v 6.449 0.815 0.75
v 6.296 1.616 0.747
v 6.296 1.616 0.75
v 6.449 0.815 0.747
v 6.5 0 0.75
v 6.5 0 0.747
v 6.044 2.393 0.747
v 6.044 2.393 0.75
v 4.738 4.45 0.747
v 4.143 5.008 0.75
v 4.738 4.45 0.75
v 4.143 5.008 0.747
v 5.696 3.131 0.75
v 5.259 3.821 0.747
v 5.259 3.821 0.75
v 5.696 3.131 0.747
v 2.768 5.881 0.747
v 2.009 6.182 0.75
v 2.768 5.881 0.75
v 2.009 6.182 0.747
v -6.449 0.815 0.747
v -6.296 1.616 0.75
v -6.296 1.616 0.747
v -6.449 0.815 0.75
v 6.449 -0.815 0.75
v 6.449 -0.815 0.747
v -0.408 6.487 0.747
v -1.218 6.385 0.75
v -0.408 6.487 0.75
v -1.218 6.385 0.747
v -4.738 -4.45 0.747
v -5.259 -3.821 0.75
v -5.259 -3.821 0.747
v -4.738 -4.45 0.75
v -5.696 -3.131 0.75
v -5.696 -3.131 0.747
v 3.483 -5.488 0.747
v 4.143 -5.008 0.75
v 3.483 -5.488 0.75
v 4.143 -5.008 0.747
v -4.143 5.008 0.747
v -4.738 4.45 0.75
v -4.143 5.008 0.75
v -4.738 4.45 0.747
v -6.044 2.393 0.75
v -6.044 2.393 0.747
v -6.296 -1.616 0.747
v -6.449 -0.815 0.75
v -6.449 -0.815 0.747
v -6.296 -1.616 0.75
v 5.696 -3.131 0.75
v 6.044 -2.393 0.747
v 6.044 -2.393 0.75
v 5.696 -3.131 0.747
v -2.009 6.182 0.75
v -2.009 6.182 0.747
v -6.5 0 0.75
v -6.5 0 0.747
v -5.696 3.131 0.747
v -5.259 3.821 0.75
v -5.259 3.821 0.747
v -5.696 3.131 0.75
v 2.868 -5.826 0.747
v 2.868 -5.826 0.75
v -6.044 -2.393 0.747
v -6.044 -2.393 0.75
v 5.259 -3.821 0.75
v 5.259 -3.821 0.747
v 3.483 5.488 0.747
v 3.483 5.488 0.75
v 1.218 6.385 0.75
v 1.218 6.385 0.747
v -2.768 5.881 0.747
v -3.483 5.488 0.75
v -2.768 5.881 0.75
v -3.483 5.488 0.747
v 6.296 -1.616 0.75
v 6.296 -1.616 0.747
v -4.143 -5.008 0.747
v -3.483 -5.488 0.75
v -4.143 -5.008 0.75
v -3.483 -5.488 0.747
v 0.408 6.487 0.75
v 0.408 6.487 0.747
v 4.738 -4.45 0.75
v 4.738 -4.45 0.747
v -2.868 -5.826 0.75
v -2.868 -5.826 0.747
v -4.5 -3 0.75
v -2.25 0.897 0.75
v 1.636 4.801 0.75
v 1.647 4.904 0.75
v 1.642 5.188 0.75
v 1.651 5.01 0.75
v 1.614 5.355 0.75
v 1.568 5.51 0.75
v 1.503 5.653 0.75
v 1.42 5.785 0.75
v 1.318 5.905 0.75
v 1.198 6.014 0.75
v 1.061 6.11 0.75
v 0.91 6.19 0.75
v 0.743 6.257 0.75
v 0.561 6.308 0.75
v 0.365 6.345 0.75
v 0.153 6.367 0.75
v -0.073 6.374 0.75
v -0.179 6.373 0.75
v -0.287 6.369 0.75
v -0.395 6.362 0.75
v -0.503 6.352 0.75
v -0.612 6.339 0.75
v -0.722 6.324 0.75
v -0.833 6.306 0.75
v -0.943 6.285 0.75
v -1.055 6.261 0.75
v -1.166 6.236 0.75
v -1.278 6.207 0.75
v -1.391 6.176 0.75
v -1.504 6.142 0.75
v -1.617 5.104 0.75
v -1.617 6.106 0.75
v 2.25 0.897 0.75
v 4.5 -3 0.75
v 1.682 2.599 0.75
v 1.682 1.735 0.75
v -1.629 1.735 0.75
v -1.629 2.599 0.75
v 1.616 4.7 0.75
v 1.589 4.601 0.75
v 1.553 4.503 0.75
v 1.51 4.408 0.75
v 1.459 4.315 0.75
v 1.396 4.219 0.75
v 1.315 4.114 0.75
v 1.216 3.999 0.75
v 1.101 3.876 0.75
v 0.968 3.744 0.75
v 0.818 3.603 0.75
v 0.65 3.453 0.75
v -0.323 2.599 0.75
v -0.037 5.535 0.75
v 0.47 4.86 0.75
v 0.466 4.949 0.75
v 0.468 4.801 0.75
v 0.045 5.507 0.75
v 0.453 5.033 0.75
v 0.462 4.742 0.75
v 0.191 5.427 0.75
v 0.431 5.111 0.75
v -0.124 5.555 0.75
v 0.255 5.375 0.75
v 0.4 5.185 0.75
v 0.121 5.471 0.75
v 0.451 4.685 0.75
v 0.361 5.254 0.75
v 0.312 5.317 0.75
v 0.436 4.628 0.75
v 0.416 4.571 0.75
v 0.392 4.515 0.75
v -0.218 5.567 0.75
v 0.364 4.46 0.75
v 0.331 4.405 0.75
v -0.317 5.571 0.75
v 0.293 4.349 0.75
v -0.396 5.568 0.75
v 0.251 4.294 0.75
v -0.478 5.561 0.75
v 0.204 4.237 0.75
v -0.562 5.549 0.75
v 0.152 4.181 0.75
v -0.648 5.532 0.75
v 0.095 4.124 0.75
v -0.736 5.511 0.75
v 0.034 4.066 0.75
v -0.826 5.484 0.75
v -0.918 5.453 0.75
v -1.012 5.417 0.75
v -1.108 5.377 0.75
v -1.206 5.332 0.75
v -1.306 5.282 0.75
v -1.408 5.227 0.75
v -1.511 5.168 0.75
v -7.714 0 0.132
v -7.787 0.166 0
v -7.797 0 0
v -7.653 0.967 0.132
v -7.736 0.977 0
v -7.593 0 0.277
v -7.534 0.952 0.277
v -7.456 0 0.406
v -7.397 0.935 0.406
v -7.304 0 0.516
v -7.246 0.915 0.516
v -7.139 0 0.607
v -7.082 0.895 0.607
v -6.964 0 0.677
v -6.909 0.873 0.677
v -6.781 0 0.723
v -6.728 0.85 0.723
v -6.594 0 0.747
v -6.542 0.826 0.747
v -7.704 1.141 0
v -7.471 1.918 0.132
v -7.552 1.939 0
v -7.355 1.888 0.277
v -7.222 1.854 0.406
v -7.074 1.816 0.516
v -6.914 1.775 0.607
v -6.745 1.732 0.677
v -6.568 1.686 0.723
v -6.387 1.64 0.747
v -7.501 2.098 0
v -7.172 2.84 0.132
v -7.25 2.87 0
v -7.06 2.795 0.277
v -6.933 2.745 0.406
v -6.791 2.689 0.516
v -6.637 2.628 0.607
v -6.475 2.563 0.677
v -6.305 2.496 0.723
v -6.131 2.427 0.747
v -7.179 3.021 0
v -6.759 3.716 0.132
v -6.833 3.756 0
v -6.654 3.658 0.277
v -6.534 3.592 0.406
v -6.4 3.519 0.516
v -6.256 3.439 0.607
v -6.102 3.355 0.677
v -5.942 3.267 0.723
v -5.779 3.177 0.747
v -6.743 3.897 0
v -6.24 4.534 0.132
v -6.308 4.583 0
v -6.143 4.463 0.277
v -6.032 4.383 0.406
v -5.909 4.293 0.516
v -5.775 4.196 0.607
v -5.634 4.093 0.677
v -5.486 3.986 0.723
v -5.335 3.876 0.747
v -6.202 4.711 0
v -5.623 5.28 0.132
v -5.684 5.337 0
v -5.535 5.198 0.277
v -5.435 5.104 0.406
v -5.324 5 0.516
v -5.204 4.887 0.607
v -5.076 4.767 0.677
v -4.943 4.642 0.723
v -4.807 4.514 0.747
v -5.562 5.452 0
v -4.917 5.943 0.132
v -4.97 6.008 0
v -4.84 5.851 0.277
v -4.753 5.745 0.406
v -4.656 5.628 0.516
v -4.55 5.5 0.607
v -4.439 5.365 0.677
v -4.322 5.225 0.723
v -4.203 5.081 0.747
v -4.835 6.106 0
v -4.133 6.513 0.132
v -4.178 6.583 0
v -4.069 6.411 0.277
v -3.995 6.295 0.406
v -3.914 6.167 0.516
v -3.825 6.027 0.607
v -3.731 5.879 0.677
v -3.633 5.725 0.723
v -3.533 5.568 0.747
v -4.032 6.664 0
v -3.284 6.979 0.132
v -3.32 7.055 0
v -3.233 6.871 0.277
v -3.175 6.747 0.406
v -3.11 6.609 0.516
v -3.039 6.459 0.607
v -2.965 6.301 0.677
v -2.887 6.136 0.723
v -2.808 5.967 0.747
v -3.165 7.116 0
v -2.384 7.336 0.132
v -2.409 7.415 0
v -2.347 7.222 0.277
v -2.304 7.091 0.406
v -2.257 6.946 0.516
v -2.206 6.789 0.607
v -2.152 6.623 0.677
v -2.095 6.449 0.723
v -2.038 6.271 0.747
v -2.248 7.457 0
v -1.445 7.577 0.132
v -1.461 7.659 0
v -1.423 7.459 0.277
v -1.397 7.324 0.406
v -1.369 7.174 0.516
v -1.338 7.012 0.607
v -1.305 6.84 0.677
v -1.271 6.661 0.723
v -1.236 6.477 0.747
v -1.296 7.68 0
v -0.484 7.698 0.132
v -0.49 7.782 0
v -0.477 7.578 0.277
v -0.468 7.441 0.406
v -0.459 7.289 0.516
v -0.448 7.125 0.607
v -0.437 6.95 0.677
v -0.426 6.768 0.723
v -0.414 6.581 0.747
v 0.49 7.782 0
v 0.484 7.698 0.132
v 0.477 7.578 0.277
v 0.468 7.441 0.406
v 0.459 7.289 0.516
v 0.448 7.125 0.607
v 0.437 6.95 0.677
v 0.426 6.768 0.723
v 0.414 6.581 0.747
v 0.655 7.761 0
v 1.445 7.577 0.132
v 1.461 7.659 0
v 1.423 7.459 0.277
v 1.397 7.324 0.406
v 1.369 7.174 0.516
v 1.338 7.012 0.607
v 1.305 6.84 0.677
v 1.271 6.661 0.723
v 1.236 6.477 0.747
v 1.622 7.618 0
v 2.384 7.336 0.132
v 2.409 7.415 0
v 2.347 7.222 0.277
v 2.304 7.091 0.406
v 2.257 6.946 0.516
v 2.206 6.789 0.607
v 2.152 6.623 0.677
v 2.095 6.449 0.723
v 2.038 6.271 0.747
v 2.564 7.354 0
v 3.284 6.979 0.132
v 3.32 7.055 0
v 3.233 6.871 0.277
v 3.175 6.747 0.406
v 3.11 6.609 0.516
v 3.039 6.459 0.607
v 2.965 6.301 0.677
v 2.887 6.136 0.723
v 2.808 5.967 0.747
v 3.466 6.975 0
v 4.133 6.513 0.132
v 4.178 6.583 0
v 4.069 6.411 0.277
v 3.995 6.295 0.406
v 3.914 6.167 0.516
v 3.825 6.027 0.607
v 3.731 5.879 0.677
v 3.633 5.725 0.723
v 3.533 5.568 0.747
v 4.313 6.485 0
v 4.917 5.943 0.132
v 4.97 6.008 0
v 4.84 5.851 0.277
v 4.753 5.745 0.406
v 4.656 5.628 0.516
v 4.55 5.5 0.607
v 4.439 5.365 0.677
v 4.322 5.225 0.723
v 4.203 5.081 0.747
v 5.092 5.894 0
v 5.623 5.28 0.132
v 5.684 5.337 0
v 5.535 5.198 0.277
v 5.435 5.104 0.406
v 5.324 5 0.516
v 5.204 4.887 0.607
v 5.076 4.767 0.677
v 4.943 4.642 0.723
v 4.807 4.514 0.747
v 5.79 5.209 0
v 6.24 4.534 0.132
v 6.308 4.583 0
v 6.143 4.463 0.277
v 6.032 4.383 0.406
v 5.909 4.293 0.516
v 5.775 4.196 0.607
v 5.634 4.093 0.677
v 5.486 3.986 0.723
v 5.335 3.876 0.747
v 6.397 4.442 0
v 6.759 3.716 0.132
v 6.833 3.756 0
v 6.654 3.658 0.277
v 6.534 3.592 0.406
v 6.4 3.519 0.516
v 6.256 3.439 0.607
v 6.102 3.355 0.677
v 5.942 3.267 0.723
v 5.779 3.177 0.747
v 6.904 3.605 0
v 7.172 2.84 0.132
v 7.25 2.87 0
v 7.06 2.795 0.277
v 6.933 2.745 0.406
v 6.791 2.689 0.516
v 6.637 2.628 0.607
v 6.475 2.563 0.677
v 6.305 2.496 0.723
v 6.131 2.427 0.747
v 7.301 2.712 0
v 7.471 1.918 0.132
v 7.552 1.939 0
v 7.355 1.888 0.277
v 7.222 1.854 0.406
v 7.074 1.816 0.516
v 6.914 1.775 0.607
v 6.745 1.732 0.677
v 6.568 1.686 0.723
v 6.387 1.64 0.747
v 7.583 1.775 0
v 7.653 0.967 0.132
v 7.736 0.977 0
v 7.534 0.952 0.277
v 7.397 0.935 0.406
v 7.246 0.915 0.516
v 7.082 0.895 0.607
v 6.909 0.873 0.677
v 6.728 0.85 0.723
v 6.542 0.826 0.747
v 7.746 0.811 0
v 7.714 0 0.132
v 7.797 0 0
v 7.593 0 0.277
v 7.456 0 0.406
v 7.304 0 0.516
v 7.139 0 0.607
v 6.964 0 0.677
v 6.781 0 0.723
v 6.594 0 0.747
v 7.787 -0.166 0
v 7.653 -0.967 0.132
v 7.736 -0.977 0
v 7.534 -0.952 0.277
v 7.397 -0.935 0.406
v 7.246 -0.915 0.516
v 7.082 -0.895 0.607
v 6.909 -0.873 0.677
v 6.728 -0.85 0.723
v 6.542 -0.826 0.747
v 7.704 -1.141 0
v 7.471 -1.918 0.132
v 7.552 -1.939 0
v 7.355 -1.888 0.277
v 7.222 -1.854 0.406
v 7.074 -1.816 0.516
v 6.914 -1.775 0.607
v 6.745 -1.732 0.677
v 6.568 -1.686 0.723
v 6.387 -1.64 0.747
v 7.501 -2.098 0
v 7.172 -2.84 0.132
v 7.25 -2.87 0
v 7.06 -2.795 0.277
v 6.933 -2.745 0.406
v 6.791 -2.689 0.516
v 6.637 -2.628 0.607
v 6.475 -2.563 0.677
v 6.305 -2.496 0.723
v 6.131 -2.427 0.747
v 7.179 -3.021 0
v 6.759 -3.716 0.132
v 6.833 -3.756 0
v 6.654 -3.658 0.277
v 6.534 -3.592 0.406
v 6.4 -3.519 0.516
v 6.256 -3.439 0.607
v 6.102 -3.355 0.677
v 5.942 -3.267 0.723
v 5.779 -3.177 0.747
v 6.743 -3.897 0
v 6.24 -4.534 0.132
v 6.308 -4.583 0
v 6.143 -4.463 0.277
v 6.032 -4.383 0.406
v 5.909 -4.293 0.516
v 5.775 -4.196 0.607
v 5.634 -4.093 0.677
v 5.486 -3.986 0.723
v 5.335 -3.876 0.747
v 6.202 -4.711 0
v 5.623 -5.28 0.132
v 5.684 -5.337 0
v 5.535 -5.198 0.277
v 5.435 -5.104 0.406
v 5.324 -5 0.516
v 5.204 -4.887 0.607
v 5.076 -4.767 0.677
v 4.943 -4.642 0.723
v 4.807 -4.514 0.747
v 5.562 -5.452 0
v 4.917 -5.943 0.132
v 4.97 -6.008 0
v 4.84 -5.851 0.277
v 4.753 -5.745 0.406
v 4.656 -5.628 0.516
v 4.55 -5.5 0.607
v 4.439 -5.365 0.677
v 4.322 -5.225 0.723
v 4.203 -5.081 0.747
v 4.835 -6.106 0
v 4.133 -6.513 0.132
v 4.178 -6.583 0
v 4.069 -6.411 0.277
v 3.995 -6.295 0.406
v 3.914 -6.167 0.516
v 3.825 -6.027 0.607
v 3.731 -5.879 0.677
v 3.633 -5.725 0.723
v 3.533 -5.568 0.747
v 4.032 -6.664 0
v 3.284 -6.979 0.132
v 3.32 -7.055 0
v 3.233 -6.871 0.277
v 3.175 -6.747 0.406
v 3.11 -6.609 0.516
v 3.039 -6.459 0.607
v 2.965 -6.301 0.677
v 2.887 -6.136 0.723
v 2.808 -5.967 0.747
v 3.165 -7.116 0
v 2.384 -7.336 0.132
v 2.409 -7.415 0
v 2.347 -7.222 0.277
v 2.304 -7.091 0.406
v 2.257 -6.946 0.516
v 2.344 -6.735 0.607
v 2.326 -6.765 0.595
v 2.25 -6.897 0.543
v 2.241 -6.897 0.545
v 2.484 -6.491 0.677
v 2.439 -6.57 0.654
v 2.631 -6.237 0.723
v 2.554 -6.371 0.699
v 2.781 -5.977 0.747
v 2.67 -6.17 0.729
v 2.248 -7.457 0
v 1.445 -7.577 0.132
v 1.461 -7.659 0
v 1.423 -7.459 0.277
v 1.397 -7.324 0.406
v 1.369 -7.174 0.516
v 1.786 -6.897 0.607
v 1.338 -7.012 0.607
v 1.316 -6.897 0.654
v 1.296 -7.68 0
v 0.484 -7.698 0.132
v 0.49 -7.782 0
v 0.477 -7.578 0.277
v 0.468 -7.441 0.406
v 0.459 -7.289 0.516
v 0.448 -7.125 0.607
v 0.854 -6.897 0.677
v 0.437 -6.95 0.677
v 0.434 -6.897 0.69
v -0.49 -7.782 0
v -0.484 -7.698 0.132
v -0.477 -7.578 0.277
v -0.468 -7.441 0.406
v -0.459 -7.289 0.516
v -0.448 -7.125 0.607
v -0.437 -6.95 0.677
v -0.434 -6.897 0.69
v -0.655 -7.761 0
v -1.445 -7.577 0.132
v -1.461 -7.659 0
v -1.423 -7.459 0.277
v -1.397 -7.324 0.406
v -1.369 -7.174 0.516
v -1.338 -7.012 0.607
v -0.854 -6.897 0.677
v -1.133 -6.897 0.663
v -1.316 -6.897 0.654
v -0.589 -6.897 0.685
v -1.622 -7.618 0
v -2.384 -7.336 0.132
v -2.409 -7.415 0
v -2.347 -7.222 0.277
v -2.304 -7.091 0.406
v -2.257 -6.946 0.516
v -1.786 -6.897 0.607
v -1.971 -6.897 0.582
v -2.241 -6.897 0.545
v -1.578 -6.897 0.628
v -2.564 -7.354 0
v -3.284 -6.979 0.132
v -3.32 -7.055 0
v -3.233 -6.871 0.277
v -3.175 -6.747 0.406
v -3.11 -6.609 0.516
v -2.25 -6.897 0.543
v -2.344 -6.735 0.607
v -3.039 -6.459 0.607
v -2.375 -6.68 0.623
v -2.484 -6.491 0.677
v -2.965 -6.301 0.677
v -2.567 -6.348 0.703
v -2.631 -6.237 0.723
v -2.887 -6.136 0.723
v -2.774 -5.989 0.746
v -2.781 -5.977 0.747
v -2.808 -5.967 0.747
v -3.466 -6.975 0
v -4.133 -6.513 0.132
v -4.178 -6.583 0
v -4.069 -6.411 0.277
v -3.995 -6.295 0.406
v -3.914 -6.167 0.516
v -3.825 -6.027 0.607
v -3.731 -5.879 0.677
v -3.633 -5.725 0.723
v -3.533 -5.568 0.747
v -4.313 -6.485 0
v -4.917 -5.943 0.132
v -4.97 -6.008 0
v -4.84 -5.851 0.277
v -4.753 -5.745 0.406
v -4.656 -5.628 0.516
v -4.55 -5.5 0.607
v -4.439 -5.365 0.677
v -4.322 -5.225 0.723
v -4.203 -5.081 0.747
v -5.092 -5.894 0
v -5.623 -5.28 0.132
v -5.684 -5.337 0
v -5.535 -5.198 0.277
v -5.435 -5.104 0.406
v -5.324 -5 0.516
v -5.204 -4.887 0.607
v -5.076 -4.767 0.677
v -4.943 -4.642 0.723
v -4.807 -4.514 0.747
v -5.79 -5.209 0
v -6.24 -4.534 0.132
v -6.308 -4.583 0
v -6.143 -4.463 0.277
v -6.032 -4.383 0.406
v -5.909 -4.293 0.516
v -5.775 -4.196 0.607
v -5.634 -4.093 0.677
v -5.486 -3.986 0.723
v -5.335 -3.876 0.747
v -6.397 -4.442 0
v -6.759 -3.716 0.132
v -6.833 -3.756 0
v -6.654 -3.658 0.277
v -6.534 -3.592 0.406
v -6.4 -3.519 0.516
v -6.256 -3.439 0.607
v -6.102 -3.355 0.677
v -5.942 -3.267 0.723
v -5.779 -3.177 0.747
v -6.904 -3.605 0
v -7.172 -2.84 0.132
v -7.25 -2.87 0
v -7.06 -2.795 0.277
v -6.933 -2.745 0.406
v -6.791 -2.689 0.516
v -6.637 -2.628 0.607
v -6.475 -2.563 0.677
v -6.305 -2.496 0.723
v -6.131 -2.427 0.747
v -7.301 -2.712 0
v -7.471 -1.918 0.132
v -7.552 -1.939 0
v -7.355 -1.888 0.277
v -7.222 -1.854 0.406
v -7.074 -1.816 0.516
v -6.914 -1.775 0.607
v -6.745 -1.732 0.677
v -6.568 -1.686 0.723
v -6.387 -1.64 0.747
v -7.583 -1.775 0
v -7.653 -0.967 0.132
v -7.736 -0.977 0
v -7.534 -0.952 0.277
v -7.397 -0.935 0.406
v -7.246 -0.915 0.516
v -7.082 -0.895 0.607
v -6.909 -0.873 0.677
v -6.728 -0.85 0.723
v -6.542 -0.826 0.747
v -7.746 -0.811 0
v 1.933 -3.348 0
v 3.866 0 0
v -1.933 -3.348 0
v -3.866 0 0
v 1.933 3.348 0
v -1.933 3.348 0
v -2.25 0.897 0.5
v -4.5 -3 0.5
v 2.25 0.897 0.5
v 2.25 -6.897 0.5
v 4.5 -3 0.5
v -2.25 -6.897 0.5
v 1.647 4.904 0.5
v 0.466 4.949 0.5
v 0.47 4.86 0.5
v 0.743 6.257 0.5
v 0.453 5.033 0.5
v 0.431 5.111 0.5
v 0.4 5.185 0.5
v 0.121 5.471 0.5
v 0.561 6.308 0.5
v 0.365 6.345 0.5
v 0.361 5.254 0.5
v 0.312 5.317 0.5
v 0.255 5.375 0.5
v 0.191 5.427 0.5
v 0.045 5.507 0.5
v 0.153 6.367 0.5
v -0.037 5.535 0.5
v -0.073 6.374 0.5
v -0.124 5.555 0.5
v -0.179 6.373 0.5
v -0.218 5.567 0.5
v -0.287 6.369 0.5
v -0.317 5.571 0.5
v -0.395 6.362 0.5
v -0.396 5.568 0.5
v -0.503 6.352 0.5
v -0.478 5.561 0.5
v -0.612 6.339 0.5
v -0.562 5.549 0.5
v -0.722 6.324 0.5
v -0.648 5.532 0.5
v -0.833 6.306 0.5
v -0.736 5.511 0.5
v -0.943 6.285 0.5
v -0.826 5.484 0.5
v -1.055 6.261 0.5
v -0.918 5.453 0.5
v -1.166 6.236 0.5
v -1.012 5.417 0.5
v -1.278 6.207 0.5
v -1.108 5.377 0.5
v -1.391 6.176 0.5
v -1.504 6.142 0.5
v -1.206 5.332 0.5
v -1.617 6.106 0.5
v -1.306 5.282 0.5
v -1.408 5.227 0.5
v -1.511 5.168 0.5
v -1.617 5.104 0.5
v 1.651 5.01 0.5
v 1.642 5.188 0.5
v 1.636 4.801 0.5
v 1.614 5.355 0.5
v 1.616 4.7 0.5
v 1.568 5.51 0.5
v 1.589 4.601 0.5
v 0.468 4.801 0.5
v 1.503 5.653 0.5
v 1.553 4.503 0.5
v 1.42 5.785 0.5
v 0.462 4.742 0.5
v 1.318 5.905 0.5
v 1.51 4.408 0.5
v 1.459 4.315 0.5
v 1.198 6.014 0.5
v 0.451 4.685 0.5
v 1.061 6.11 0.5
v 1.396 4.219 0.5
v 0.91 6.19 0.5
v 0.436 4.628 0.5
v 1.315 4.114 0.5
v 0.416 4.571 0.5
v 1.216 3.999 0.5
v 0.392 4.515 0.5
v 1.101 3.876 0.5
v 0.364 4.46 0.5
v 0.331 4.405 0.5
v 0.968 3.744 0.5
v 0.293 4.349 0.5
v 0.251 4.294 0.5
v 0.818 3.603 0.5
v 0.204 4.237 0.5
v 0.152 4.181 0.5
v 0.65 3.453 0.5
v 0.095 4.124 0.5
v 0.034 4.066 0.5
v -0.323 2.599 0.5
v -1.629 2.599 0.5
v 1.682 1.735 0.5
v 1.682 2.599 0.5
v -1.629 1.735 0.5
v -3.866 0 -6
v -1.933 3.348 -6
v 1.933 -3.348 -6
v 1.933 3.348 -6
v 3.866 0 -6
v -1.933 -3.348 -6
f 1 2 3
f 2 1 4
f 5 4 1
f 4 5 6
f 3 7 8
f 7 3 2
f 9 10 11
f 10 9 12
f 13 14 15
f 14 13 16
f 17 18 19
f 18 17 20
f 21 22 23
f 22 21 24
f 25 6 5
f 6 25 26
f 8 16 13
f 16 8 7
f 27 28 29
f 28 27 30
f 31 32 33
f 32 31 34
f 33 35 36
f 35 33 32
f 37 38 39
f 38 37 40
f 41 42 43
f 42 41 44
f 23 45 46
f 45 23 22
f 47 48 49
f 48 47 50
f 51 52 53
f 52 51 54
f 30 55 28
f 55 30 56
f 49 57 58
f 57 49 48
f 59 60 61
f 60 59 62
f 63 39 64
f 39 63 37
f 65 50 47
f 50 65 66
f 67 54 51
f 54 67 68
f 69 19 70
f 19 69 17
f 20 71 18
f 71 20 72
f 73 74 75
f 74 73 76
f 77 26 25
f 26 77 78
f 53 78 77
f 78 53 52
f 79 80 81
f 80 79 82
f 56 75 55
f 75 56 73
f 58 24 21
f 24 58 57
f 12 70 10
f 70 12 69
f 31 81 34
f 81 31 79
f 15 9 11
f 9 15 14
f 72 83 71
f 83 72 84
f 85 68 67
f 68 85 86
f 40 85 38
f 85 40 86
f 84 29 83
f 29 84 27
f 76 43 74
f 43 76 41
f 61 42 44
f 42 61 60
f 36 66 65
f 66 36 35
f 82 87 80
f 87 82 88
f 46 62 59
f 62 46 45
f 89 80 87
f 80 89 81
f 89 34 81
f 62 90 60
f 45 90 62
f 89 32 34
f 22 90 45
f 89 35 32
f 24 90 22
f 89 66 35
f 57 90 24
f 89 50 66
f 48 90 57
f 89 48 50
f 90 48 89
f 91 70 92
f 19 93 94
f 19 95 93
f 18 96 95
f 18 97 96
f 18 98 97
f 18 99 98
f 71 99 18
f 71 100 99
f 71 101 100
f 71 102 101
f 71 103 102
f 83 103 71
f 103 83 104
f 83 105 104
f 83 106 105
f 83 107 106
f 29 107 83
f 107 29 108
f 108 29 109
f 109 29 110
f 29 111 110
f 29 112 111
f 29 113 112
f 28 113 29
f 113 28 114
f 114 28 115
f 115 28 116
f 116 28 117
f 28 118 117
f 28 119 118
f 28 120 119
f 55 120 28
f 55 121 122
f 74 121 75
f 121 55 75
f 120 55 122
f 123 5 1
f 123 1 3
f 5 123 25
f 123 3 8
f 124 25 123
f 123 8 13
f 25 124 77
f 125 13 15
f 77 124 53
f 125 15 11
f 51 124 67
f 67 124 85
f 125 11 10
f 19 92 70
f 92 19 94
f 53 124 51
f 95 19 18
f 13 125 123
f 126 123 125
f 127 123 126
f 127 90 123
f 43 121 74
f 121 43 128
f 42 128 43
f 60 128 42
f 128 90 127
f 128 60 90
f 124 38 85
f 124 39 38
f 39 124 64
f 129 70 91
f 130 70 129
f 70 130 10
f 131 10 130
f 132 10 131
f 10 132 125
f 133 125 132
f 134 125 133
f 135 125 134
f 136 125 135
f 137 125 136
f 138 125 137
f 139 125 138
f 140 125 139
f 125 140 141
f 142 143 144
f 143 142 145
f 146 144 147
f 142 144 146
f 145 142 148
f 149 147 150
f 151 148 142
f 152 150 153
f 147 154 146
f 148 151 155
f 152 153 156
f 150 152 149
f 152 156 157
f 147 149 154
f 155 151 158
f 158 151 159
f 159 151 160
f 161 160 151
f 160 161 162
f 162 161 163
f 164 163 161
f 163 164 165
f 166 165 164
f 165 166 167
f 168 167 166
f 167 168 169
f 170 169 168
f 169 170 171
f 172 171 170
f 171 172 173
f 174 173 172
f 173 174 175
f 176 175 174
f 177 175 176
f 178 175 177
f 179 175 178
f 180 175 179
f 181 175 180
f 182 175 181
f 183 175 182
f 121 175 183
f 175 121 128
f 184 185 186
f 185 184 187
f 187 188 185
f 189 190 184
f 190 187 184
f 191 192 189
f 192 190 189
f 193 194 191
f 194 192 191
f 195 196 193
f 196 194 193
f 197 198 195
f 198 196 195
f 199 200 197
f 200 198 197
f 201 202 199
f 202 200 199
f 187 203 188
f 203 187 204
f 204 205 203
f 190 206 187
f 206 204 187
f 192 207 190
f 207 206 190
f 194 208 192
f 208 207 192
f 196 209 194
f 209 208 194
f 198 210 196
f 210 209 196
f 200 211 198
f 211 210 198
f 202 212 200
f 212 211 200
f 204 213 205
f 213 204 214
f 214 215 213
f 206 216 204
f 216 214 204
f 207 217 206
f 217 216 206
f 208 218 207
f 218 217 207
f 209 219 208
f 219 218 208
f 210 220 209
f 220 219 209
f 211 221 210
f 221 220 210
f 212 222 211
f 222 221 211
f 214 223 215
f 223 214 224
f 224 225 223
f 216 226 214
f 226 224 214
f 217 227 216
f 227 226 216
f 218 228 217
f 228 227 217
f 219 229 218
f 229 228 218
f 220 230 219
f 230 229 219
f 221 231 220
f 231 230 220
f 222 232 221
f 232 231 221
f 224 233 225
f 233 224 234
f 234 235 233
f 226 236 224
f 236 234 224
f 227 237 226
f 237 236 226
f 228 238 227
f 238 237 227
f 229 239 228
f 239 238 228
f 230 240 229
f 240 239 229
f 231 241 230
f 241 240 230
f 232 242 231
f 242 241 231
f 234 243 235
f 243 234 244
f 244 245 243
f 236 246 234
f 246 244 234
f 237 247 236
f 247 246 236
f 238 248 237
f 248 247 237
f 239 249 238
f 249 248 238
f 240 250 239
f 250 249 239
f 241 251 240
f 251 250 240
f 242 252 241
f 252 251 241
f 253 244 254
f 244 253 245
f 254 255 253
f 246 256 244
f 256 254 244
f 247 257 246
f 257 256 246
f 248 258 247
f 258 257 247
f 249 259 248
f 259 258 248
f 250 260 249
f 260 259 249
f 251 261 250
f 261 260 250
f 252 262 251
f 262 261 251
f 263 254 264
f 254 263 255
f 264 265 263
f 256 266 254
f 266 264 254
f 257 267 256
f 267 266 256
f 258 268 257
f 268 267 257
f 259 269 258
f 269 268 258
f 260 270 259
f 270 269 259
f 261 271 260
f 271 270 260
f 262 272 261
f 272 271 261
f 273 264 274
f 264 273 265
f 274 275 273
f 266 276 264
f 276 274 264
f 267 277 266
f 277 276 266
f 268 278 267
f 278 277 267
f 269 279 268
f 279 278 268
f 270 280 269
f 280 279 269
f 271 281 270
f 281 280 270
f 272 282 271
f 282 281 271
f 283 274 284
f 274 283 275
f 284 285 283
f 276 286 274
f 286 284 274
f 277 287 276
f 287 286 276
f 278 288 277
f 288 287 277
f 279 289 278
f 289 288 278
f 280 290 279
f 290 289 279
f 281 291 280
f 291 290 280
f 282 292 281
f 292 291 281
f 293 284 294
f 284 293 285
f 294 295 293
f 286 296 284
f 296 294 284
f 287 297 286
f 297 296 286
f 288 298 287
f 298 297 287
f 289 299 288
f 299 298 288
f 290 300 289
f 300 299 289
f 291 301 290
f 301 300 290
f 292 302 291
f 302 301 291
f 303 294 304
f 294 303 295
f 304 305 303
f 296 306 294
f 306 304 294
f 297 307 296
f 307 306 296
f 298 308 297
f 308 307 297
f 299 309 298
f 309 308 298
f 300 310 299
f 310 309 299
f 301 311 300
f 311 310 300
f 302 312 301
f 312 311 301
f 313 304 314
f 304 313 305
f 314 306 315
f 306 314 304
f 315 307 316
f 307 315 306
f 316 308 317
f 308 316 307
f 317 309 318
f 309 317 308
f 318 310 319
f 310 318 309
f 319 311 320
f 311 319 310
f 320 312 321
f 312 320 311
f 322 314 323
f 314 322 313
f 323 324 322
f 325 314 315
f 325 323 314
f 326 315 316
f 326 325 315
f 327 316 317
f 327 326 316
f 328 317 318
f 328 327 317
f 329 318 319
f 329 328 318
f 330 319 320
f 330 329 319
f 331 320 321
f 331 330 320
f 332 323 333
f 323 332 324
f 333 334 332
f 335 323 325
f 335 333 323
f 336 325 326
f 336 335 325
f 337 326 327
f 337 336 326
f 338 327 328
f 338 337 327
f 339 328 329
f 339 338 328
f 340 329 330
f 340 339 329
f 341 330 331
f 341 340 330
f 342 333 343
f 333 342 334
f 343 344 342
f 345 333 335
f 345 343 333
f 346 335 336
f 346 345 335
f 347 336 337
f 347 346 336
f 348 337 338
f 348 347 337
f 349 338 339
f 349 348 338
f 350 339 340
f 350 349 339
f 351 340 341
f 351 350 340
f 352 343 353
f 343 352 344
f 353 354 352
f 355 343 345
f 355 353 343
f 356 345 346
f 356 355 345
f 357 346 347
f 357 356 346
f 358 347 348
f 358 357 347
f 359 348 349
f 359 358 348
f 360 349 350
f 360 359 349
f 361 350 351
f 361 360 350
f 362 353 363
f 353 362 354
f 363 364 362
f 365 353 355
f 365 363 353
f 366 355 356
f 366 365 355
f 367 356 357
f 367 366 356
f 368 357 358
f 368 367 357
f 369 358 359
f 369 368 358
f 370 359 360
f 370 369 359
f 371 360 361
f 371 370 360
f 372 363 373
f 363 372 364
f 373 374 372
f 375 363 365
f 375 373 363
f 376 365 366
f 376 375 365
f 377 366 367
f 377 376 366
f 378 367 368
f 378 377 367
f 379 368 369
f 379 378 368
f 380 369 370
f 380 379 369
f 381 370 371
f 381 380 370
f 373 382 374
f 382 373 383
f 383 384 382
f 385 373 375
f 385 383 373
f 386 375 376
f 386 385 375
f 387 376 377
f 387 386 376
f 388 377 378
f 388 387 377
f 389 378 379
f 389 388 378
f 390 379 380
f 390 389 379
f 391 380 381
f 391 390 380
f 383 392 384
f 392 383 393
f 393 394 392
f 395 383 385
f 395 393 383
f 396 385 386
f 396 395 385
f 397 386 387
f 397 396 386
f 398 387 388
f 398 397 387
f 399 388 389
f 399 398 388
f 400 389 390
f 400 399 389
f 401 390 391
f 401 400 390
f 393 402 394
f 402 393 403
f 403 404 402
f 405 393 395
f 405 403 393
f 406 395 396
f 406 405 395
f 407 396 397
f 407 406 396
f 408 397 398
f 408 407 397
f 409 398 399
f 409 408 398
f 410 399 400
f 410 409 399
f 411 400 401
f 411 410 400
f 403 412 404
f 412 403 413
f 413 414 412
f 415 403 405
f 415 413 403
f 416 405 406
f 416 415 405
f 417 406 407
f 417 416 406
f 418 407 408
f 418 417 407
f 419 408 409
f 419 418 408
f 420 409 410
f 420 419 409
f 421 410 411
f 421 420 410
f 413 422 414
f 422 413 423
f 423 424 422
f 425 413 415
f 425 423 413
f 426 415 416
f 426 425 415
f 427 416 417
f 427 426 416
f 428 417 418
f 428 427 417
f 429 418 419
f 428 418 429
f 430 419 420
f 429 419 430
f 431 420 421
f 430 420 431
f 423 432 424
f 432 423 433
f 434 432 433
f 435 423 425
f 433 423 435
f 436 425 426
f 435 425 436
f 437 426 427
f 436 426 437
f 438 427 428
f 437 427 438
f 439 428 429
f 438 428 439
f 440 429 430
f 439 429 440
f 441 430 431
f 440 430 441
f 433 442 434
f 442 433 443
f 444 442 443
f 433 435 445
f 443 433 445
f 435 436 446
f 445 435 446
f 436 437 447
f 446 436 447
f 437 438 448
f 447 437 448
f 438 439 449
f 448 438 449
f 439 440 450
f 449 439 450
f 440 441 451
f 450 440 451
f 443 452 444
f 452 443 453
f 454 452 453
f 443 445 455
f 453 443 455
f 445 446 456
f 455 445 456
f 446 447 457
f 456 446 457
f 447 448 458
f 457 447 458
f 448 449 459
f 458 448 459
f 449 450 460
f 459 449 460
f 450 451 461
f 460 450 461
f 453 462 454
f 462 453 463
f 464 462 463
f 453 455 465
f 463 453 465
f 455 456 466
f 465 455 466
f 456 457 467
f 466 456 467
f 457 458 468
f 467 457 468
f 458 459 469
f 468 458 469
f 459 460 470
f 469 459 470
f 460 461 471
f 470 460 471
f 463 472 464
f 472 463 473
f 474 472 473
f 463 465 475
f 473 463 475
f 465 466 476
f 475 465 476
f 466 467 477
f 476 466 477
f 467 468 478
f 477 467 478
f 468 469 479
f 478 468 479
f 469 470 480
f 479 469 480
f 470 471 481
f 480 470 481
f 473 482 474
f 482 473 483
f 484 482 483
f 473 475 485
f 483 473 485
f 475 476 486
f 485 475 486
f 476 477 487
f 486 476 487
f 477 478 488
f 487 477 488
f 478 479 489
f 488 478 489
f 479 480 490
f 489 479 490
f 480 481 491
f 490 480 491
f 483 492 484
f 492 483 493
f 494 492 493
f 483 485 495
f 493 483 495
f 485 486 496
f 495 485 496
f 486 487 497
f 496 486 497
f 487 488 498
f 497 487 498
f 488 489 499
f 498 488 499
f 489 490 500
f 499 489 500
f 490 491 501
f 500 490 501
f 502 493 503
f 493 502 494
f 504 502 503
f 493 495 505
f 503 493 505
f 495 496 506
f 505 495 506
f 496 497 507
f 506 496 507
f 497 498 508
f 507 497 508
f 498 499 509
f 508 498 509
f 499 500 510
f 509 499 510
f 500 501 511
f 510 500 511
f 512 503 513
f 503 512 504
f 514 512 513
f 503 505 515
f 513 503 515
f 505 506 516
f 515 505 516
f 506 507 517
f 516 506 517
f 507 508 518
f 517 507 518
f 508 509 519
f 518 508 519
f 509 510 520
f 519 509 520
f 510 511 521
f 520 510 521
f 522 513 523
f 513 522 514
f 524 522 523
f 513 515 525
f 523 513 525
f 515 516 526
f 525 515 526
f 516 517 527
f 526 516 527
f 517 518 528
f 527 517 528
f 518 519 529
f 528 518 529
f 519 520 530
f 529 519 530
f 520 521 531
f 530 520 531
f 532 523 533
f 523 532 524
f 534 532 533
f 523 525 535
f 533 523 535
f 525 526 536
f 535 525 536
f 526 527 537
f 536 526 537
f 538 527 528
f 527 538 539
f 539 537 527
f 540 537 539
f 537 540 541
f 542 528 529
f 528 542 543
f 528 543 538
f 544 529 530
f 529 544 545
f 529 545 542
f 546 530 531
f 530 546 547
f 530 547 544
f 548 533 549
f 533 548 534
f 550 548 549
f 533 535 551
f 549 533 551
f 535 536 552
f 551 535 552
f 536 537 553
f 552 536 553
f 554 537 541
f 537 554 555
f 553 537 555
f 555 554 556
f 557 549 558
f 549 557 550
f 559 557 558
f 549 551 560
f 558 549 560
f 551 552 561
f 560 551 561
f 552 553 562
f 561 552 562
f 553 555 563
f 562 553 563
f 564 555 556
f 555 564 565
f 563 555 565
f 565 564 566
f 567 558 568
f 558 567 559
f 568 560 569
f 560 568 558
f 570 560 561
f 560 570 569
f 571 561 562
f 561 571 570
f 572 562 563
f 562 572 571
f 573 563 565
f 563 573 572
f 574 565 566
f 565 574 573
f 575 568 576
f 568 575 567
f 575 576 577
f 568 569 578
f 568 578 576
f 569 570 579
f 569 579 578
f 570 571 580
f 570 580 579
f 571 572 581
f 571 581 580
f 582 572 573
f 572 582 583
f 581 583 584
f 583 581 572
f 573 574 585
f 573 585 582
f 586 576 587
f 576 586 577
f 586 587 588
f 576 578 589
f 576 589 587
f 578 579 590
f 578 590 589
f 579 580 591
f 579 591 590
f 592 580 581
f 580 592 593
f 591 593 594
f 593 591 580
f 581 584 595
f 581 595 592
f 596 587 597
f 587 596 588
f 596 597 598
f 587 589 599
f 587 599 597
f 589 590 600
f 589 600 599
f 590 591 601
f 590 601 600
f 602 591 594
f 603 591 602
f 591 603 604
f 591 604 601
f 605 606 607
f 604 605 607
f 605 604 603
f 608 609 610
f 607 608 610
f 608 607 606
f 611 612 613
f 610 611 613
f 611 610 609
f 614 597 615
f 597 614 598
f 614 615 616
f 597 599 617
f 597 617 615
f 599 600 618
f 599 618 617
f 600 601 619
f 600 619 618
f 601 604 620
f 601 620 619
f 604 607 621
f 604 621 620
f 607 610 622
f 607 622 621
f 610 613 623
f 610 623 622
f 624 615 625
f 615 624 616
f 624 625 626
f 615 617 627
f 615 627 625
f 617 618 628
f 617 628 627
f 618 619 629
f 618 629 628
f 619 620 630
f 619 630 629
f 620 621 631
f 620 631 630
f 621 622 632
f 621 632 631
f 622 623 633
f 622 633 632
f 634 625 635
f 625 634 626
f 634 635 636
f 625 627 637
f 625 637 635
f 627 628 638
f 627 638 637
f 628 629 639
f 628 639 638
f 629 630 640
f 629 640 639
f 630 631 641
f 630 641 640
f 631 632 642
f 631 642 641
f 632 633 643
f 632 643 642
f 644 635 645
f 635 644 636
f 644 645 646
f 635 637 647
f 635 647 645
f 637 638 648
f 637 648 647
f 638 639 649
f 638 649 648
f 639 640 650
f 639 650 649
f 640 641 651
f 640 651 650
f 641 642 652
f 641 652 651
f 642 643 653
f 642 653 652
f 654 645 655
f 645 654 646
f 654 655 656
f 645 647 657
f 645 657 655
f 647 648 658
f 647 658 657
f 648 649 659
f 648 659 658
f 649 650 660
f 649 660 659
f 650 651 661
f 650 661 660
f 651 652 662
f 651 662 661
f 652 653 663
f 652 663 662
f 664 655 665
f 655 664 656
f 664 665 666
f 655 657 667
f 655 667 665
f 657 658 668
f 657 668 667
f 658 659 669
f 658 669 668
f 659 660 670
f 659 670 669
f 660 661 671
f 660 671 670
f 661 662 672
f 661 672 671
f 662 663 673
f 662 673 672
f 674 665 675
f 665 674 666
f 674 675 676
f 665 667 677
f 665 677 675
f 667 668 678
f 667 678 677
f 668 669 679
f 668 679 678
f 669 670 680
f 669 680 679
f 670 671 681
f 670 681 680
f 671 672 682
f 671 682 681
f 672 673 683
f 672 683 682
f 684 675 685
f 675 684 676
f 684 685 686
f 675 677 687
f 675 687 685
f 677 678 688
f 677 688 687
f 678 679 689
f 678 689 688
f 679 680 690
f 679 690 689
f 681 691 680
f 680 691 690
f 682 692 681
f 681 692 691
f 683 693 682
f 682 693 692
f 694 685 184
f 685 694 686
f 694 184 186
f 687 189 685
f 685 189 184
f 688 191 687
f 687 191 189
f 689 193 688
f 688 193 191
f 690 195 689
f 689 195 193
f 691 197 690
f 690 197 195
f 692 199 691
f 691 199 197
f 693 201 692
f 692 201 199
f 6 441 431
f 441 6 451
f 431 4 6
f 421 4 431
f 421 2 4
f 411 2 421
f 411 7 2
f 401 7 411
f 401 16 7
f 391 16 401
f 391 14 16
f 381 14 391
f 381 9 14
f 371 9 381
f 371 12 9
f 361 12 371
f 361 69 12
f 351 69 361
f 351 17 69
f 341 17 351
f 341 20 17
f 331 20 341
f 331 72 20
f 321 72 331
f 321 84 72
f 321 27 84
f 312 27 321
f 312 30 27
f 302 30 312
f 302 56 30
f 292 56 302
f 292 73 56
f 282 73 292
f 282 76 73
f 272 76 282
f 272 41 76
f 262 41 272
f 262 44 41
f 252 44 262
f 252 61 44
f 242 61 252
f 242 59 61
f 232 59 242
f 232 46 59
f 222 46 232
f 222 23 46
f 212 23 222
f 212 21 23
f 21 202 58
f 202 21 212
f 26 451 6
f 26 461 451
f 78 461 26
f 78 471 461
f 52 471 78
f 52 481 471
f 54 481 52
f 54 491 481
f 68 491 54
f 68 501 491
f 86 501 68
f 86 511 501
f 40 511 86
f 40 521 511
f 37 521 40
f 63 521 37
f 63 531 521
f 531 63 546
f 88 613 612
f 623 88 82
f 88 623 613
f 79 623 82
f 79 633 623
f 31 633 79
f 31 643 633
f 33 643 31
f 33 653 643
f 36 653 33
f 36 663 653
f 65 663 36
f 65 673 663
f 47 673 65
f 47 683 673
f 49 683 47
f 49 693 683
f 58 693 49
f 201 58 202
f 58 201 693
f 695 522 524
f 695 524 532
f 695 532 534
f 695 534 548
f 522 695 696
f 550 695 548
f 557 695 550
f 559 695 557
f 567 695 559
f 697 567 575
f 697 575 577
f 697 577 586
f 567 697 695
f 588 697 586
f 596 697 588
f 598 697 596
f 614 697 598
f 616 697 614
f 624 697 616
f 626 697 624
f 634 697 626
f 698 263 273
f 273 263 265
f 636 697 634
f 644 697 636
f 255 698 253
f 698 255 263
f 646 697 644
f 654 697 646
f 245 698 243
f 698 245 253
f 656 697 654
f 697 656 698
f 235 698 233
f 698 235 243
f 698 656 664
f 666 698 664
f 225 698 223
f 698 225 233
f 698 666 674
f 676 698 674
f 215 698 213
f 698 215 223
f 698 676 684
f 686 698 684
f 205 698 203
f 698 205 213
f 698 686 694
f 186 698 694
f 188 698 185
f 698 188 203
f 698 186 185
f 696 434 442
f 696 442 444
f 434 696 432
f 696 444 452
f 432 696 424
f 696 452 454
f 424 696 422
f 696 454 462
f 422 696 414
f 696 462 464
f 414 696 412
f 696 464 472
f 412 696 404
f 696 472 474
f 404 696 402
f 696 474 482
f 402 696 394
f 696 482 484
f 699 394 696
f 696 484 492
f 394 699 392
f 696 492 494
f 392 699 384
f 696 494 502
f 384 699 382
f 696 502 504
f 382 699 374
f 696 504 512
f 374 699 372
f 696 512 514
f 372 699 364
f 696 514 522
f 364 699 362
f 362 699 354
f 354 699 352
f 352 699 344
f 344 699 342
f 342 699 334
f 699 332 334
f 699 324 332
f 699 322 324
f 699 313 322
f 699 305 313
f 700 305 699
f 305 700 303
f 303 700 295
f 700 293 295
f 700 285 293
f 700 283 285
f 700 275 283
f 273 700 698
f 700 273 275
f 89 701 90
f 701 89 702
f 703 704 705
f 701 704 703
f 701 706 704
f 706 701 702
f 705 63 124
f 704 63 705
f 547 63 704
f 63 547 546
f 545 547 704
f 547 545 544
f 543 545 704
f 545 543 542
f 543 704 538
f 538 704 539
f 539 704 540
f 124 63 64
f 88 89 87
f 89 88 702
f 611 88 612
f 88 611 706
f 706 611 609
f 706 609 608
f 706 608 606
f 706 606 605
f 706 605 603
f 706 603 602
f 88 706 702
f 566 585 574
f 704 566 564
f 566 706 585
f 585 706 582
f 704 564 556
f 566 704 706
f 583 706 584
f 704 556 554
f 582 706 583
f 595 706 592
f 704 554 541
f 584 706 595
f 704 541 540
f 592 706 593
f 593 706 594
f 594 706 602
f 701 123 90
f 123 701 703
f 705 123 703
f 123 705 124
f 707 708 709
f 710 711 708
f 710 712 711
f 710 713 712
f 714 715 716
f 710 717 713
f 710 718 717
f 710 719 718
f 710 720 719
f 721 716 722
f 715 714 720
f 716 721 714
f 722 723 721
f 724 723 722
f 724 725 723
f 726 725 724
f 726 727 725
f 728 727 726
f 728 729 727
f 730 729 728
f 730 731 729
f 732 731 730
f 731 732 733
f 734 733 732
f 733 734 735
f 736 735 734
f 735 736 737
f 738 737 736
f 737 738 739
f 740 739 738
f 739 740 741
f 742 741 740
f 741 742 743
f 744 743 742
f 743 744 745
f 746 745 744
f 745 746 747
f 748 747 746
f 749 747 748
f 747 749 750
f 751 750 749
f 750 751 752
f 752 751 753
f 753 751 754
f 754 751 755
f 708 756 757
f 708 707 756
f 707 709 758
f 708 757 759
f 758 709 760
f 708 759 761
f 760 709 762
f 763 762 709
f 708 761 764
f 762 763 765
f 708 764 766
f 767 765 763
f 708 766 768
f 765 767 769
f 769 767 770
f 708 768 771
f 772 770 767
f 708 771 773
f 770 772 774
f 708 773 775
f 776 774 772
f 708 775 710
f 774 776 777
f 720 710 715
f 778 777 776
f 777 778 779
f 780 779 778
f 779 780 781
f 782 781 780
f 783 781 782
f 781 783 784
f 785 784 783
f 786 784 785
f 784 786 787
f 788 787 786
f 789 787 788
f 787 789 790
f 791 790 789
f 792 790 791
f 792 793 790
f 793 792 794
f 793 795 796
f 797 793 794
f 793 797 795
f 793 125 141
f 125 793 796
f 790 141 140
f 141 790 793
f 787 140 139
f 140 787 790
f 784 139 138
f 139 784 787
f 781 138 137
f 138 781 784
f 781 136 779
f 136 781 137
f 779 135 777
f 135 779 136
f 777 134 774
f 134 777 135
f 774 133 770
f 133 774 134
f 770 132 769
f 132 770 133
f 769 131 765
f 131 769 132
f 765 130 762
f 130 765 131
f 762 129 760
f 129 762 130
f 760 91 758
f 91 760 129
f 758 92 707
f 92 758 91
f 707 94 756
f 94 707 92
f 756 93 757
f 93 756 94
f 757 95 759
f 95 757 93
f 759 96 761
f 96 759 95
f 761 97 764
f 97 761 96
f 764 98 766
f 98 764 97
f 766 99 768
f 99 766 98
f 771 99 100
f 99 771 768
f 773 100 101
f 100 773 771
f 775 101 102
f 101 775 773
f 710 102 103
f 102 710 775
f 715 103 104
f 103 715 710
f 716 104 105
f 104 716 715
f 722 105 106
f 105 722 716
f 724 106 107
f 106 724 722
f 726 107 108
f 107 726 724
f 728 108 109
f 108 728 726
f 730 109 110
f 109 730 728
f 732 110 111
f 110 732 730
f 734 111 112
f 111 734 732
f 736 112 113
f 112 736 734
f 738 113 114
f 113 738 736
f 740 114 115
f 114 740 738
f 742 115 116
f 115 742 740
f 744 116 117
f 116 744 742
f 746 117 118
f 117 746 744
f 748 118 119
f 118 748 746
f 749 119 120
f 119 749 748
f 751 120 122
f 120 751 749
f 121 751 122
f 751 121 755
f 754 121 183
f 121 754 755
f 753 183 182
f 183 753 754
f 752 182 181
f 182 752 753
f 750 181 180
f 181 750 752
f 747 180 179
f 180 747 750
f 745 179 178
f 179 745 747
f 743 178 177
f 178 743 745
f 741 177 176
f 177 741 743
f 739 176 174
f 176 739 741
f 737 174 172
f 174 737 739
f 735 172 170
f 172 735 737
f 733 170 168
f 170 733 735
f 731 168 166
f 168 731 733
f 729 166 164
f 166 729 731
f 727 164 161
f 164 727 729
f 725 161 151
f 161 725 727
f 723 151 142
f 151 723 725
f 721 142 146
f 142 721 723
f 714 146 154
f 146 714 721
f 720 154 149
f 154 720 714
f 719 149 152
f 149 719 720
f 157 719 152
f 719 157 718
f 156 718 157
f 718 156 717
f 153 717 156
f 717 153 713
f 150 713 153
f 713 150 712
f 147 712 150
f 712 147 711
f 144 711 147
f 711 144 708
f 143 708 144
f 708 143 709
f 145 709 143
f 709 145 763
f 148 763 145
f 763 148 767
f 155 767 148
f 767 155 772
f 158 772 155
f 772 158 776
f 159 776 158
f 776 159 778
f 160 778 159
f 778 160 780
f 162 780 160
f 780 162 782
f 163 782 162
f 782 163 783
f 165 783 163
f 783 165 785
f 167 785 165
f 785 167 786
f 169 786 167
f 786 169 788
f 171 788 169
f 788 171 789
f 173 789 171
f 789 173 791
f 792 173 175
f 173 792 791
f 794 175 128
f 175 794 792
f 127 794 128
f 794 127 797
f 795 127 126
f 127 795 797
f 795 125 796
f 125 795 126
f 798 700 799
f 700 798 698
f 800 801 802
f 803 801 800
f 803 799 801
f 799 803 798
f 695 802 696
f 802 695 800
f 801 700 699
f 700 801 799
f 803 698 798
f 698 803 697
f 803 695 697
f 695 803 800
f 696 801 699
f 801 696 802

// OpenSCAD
$fn = 50;


union() {
	difference() {
		union() {
			translate(v = [0, 0, -0.7500000000]) {
				cylinder(h = 1.5000000000, r = 6.5000000000);
			}
			translate(v = [0, 0, -0.7500000000]) {
				rotate_extrude(angle = 360) {
					translate(v = [6.5000000000, 0, 0]) {
						circle(r = 1.5000000000);
					}
				}
			}
		}
		union() {
			translate(v = [-25.0000000000, -25.0000000000, -50]) {
				cube(size = [50, 50, 50]);
			}
			translate(v = [0, -3, 0.5000000000]) {
				#linear_extrude(height = 0.2500000000) {
					polygon(points = [[4.5000000000, 0.0000000000], [2.2500000000, 3.8971143170], [-2.2500000000, 3.8971143170], [-4.5000000000, 0.0000000000], [-2.2500000000, -3.8971143170], [2.2500000000, -3.8971143170]]);
				}
			}
			#translate(v = [0, 4, 0.5000000000]) {
				linear_extrude(height = 0.2500000000) {
					text(font = "SegoiUI:Bold", halign = "center", size = 4.5000000000, text = "2", valign = "center");
				}
			}
		}
	}
	union() {
		translate(v = [0, 0, -6]) {
			linear_extrude(height = 6) {
				polygon(points = [[3.8658550000, 0.0000000000], [1.9329275000, 3.3479286373], [-1.9329275000, 3.3479286373], [-3.8658550000, 0.0000000000], [-1.9329275000, -3.3479286373], [1.9329275000, -3.3479286373]]);
			}
		}
	}
}
